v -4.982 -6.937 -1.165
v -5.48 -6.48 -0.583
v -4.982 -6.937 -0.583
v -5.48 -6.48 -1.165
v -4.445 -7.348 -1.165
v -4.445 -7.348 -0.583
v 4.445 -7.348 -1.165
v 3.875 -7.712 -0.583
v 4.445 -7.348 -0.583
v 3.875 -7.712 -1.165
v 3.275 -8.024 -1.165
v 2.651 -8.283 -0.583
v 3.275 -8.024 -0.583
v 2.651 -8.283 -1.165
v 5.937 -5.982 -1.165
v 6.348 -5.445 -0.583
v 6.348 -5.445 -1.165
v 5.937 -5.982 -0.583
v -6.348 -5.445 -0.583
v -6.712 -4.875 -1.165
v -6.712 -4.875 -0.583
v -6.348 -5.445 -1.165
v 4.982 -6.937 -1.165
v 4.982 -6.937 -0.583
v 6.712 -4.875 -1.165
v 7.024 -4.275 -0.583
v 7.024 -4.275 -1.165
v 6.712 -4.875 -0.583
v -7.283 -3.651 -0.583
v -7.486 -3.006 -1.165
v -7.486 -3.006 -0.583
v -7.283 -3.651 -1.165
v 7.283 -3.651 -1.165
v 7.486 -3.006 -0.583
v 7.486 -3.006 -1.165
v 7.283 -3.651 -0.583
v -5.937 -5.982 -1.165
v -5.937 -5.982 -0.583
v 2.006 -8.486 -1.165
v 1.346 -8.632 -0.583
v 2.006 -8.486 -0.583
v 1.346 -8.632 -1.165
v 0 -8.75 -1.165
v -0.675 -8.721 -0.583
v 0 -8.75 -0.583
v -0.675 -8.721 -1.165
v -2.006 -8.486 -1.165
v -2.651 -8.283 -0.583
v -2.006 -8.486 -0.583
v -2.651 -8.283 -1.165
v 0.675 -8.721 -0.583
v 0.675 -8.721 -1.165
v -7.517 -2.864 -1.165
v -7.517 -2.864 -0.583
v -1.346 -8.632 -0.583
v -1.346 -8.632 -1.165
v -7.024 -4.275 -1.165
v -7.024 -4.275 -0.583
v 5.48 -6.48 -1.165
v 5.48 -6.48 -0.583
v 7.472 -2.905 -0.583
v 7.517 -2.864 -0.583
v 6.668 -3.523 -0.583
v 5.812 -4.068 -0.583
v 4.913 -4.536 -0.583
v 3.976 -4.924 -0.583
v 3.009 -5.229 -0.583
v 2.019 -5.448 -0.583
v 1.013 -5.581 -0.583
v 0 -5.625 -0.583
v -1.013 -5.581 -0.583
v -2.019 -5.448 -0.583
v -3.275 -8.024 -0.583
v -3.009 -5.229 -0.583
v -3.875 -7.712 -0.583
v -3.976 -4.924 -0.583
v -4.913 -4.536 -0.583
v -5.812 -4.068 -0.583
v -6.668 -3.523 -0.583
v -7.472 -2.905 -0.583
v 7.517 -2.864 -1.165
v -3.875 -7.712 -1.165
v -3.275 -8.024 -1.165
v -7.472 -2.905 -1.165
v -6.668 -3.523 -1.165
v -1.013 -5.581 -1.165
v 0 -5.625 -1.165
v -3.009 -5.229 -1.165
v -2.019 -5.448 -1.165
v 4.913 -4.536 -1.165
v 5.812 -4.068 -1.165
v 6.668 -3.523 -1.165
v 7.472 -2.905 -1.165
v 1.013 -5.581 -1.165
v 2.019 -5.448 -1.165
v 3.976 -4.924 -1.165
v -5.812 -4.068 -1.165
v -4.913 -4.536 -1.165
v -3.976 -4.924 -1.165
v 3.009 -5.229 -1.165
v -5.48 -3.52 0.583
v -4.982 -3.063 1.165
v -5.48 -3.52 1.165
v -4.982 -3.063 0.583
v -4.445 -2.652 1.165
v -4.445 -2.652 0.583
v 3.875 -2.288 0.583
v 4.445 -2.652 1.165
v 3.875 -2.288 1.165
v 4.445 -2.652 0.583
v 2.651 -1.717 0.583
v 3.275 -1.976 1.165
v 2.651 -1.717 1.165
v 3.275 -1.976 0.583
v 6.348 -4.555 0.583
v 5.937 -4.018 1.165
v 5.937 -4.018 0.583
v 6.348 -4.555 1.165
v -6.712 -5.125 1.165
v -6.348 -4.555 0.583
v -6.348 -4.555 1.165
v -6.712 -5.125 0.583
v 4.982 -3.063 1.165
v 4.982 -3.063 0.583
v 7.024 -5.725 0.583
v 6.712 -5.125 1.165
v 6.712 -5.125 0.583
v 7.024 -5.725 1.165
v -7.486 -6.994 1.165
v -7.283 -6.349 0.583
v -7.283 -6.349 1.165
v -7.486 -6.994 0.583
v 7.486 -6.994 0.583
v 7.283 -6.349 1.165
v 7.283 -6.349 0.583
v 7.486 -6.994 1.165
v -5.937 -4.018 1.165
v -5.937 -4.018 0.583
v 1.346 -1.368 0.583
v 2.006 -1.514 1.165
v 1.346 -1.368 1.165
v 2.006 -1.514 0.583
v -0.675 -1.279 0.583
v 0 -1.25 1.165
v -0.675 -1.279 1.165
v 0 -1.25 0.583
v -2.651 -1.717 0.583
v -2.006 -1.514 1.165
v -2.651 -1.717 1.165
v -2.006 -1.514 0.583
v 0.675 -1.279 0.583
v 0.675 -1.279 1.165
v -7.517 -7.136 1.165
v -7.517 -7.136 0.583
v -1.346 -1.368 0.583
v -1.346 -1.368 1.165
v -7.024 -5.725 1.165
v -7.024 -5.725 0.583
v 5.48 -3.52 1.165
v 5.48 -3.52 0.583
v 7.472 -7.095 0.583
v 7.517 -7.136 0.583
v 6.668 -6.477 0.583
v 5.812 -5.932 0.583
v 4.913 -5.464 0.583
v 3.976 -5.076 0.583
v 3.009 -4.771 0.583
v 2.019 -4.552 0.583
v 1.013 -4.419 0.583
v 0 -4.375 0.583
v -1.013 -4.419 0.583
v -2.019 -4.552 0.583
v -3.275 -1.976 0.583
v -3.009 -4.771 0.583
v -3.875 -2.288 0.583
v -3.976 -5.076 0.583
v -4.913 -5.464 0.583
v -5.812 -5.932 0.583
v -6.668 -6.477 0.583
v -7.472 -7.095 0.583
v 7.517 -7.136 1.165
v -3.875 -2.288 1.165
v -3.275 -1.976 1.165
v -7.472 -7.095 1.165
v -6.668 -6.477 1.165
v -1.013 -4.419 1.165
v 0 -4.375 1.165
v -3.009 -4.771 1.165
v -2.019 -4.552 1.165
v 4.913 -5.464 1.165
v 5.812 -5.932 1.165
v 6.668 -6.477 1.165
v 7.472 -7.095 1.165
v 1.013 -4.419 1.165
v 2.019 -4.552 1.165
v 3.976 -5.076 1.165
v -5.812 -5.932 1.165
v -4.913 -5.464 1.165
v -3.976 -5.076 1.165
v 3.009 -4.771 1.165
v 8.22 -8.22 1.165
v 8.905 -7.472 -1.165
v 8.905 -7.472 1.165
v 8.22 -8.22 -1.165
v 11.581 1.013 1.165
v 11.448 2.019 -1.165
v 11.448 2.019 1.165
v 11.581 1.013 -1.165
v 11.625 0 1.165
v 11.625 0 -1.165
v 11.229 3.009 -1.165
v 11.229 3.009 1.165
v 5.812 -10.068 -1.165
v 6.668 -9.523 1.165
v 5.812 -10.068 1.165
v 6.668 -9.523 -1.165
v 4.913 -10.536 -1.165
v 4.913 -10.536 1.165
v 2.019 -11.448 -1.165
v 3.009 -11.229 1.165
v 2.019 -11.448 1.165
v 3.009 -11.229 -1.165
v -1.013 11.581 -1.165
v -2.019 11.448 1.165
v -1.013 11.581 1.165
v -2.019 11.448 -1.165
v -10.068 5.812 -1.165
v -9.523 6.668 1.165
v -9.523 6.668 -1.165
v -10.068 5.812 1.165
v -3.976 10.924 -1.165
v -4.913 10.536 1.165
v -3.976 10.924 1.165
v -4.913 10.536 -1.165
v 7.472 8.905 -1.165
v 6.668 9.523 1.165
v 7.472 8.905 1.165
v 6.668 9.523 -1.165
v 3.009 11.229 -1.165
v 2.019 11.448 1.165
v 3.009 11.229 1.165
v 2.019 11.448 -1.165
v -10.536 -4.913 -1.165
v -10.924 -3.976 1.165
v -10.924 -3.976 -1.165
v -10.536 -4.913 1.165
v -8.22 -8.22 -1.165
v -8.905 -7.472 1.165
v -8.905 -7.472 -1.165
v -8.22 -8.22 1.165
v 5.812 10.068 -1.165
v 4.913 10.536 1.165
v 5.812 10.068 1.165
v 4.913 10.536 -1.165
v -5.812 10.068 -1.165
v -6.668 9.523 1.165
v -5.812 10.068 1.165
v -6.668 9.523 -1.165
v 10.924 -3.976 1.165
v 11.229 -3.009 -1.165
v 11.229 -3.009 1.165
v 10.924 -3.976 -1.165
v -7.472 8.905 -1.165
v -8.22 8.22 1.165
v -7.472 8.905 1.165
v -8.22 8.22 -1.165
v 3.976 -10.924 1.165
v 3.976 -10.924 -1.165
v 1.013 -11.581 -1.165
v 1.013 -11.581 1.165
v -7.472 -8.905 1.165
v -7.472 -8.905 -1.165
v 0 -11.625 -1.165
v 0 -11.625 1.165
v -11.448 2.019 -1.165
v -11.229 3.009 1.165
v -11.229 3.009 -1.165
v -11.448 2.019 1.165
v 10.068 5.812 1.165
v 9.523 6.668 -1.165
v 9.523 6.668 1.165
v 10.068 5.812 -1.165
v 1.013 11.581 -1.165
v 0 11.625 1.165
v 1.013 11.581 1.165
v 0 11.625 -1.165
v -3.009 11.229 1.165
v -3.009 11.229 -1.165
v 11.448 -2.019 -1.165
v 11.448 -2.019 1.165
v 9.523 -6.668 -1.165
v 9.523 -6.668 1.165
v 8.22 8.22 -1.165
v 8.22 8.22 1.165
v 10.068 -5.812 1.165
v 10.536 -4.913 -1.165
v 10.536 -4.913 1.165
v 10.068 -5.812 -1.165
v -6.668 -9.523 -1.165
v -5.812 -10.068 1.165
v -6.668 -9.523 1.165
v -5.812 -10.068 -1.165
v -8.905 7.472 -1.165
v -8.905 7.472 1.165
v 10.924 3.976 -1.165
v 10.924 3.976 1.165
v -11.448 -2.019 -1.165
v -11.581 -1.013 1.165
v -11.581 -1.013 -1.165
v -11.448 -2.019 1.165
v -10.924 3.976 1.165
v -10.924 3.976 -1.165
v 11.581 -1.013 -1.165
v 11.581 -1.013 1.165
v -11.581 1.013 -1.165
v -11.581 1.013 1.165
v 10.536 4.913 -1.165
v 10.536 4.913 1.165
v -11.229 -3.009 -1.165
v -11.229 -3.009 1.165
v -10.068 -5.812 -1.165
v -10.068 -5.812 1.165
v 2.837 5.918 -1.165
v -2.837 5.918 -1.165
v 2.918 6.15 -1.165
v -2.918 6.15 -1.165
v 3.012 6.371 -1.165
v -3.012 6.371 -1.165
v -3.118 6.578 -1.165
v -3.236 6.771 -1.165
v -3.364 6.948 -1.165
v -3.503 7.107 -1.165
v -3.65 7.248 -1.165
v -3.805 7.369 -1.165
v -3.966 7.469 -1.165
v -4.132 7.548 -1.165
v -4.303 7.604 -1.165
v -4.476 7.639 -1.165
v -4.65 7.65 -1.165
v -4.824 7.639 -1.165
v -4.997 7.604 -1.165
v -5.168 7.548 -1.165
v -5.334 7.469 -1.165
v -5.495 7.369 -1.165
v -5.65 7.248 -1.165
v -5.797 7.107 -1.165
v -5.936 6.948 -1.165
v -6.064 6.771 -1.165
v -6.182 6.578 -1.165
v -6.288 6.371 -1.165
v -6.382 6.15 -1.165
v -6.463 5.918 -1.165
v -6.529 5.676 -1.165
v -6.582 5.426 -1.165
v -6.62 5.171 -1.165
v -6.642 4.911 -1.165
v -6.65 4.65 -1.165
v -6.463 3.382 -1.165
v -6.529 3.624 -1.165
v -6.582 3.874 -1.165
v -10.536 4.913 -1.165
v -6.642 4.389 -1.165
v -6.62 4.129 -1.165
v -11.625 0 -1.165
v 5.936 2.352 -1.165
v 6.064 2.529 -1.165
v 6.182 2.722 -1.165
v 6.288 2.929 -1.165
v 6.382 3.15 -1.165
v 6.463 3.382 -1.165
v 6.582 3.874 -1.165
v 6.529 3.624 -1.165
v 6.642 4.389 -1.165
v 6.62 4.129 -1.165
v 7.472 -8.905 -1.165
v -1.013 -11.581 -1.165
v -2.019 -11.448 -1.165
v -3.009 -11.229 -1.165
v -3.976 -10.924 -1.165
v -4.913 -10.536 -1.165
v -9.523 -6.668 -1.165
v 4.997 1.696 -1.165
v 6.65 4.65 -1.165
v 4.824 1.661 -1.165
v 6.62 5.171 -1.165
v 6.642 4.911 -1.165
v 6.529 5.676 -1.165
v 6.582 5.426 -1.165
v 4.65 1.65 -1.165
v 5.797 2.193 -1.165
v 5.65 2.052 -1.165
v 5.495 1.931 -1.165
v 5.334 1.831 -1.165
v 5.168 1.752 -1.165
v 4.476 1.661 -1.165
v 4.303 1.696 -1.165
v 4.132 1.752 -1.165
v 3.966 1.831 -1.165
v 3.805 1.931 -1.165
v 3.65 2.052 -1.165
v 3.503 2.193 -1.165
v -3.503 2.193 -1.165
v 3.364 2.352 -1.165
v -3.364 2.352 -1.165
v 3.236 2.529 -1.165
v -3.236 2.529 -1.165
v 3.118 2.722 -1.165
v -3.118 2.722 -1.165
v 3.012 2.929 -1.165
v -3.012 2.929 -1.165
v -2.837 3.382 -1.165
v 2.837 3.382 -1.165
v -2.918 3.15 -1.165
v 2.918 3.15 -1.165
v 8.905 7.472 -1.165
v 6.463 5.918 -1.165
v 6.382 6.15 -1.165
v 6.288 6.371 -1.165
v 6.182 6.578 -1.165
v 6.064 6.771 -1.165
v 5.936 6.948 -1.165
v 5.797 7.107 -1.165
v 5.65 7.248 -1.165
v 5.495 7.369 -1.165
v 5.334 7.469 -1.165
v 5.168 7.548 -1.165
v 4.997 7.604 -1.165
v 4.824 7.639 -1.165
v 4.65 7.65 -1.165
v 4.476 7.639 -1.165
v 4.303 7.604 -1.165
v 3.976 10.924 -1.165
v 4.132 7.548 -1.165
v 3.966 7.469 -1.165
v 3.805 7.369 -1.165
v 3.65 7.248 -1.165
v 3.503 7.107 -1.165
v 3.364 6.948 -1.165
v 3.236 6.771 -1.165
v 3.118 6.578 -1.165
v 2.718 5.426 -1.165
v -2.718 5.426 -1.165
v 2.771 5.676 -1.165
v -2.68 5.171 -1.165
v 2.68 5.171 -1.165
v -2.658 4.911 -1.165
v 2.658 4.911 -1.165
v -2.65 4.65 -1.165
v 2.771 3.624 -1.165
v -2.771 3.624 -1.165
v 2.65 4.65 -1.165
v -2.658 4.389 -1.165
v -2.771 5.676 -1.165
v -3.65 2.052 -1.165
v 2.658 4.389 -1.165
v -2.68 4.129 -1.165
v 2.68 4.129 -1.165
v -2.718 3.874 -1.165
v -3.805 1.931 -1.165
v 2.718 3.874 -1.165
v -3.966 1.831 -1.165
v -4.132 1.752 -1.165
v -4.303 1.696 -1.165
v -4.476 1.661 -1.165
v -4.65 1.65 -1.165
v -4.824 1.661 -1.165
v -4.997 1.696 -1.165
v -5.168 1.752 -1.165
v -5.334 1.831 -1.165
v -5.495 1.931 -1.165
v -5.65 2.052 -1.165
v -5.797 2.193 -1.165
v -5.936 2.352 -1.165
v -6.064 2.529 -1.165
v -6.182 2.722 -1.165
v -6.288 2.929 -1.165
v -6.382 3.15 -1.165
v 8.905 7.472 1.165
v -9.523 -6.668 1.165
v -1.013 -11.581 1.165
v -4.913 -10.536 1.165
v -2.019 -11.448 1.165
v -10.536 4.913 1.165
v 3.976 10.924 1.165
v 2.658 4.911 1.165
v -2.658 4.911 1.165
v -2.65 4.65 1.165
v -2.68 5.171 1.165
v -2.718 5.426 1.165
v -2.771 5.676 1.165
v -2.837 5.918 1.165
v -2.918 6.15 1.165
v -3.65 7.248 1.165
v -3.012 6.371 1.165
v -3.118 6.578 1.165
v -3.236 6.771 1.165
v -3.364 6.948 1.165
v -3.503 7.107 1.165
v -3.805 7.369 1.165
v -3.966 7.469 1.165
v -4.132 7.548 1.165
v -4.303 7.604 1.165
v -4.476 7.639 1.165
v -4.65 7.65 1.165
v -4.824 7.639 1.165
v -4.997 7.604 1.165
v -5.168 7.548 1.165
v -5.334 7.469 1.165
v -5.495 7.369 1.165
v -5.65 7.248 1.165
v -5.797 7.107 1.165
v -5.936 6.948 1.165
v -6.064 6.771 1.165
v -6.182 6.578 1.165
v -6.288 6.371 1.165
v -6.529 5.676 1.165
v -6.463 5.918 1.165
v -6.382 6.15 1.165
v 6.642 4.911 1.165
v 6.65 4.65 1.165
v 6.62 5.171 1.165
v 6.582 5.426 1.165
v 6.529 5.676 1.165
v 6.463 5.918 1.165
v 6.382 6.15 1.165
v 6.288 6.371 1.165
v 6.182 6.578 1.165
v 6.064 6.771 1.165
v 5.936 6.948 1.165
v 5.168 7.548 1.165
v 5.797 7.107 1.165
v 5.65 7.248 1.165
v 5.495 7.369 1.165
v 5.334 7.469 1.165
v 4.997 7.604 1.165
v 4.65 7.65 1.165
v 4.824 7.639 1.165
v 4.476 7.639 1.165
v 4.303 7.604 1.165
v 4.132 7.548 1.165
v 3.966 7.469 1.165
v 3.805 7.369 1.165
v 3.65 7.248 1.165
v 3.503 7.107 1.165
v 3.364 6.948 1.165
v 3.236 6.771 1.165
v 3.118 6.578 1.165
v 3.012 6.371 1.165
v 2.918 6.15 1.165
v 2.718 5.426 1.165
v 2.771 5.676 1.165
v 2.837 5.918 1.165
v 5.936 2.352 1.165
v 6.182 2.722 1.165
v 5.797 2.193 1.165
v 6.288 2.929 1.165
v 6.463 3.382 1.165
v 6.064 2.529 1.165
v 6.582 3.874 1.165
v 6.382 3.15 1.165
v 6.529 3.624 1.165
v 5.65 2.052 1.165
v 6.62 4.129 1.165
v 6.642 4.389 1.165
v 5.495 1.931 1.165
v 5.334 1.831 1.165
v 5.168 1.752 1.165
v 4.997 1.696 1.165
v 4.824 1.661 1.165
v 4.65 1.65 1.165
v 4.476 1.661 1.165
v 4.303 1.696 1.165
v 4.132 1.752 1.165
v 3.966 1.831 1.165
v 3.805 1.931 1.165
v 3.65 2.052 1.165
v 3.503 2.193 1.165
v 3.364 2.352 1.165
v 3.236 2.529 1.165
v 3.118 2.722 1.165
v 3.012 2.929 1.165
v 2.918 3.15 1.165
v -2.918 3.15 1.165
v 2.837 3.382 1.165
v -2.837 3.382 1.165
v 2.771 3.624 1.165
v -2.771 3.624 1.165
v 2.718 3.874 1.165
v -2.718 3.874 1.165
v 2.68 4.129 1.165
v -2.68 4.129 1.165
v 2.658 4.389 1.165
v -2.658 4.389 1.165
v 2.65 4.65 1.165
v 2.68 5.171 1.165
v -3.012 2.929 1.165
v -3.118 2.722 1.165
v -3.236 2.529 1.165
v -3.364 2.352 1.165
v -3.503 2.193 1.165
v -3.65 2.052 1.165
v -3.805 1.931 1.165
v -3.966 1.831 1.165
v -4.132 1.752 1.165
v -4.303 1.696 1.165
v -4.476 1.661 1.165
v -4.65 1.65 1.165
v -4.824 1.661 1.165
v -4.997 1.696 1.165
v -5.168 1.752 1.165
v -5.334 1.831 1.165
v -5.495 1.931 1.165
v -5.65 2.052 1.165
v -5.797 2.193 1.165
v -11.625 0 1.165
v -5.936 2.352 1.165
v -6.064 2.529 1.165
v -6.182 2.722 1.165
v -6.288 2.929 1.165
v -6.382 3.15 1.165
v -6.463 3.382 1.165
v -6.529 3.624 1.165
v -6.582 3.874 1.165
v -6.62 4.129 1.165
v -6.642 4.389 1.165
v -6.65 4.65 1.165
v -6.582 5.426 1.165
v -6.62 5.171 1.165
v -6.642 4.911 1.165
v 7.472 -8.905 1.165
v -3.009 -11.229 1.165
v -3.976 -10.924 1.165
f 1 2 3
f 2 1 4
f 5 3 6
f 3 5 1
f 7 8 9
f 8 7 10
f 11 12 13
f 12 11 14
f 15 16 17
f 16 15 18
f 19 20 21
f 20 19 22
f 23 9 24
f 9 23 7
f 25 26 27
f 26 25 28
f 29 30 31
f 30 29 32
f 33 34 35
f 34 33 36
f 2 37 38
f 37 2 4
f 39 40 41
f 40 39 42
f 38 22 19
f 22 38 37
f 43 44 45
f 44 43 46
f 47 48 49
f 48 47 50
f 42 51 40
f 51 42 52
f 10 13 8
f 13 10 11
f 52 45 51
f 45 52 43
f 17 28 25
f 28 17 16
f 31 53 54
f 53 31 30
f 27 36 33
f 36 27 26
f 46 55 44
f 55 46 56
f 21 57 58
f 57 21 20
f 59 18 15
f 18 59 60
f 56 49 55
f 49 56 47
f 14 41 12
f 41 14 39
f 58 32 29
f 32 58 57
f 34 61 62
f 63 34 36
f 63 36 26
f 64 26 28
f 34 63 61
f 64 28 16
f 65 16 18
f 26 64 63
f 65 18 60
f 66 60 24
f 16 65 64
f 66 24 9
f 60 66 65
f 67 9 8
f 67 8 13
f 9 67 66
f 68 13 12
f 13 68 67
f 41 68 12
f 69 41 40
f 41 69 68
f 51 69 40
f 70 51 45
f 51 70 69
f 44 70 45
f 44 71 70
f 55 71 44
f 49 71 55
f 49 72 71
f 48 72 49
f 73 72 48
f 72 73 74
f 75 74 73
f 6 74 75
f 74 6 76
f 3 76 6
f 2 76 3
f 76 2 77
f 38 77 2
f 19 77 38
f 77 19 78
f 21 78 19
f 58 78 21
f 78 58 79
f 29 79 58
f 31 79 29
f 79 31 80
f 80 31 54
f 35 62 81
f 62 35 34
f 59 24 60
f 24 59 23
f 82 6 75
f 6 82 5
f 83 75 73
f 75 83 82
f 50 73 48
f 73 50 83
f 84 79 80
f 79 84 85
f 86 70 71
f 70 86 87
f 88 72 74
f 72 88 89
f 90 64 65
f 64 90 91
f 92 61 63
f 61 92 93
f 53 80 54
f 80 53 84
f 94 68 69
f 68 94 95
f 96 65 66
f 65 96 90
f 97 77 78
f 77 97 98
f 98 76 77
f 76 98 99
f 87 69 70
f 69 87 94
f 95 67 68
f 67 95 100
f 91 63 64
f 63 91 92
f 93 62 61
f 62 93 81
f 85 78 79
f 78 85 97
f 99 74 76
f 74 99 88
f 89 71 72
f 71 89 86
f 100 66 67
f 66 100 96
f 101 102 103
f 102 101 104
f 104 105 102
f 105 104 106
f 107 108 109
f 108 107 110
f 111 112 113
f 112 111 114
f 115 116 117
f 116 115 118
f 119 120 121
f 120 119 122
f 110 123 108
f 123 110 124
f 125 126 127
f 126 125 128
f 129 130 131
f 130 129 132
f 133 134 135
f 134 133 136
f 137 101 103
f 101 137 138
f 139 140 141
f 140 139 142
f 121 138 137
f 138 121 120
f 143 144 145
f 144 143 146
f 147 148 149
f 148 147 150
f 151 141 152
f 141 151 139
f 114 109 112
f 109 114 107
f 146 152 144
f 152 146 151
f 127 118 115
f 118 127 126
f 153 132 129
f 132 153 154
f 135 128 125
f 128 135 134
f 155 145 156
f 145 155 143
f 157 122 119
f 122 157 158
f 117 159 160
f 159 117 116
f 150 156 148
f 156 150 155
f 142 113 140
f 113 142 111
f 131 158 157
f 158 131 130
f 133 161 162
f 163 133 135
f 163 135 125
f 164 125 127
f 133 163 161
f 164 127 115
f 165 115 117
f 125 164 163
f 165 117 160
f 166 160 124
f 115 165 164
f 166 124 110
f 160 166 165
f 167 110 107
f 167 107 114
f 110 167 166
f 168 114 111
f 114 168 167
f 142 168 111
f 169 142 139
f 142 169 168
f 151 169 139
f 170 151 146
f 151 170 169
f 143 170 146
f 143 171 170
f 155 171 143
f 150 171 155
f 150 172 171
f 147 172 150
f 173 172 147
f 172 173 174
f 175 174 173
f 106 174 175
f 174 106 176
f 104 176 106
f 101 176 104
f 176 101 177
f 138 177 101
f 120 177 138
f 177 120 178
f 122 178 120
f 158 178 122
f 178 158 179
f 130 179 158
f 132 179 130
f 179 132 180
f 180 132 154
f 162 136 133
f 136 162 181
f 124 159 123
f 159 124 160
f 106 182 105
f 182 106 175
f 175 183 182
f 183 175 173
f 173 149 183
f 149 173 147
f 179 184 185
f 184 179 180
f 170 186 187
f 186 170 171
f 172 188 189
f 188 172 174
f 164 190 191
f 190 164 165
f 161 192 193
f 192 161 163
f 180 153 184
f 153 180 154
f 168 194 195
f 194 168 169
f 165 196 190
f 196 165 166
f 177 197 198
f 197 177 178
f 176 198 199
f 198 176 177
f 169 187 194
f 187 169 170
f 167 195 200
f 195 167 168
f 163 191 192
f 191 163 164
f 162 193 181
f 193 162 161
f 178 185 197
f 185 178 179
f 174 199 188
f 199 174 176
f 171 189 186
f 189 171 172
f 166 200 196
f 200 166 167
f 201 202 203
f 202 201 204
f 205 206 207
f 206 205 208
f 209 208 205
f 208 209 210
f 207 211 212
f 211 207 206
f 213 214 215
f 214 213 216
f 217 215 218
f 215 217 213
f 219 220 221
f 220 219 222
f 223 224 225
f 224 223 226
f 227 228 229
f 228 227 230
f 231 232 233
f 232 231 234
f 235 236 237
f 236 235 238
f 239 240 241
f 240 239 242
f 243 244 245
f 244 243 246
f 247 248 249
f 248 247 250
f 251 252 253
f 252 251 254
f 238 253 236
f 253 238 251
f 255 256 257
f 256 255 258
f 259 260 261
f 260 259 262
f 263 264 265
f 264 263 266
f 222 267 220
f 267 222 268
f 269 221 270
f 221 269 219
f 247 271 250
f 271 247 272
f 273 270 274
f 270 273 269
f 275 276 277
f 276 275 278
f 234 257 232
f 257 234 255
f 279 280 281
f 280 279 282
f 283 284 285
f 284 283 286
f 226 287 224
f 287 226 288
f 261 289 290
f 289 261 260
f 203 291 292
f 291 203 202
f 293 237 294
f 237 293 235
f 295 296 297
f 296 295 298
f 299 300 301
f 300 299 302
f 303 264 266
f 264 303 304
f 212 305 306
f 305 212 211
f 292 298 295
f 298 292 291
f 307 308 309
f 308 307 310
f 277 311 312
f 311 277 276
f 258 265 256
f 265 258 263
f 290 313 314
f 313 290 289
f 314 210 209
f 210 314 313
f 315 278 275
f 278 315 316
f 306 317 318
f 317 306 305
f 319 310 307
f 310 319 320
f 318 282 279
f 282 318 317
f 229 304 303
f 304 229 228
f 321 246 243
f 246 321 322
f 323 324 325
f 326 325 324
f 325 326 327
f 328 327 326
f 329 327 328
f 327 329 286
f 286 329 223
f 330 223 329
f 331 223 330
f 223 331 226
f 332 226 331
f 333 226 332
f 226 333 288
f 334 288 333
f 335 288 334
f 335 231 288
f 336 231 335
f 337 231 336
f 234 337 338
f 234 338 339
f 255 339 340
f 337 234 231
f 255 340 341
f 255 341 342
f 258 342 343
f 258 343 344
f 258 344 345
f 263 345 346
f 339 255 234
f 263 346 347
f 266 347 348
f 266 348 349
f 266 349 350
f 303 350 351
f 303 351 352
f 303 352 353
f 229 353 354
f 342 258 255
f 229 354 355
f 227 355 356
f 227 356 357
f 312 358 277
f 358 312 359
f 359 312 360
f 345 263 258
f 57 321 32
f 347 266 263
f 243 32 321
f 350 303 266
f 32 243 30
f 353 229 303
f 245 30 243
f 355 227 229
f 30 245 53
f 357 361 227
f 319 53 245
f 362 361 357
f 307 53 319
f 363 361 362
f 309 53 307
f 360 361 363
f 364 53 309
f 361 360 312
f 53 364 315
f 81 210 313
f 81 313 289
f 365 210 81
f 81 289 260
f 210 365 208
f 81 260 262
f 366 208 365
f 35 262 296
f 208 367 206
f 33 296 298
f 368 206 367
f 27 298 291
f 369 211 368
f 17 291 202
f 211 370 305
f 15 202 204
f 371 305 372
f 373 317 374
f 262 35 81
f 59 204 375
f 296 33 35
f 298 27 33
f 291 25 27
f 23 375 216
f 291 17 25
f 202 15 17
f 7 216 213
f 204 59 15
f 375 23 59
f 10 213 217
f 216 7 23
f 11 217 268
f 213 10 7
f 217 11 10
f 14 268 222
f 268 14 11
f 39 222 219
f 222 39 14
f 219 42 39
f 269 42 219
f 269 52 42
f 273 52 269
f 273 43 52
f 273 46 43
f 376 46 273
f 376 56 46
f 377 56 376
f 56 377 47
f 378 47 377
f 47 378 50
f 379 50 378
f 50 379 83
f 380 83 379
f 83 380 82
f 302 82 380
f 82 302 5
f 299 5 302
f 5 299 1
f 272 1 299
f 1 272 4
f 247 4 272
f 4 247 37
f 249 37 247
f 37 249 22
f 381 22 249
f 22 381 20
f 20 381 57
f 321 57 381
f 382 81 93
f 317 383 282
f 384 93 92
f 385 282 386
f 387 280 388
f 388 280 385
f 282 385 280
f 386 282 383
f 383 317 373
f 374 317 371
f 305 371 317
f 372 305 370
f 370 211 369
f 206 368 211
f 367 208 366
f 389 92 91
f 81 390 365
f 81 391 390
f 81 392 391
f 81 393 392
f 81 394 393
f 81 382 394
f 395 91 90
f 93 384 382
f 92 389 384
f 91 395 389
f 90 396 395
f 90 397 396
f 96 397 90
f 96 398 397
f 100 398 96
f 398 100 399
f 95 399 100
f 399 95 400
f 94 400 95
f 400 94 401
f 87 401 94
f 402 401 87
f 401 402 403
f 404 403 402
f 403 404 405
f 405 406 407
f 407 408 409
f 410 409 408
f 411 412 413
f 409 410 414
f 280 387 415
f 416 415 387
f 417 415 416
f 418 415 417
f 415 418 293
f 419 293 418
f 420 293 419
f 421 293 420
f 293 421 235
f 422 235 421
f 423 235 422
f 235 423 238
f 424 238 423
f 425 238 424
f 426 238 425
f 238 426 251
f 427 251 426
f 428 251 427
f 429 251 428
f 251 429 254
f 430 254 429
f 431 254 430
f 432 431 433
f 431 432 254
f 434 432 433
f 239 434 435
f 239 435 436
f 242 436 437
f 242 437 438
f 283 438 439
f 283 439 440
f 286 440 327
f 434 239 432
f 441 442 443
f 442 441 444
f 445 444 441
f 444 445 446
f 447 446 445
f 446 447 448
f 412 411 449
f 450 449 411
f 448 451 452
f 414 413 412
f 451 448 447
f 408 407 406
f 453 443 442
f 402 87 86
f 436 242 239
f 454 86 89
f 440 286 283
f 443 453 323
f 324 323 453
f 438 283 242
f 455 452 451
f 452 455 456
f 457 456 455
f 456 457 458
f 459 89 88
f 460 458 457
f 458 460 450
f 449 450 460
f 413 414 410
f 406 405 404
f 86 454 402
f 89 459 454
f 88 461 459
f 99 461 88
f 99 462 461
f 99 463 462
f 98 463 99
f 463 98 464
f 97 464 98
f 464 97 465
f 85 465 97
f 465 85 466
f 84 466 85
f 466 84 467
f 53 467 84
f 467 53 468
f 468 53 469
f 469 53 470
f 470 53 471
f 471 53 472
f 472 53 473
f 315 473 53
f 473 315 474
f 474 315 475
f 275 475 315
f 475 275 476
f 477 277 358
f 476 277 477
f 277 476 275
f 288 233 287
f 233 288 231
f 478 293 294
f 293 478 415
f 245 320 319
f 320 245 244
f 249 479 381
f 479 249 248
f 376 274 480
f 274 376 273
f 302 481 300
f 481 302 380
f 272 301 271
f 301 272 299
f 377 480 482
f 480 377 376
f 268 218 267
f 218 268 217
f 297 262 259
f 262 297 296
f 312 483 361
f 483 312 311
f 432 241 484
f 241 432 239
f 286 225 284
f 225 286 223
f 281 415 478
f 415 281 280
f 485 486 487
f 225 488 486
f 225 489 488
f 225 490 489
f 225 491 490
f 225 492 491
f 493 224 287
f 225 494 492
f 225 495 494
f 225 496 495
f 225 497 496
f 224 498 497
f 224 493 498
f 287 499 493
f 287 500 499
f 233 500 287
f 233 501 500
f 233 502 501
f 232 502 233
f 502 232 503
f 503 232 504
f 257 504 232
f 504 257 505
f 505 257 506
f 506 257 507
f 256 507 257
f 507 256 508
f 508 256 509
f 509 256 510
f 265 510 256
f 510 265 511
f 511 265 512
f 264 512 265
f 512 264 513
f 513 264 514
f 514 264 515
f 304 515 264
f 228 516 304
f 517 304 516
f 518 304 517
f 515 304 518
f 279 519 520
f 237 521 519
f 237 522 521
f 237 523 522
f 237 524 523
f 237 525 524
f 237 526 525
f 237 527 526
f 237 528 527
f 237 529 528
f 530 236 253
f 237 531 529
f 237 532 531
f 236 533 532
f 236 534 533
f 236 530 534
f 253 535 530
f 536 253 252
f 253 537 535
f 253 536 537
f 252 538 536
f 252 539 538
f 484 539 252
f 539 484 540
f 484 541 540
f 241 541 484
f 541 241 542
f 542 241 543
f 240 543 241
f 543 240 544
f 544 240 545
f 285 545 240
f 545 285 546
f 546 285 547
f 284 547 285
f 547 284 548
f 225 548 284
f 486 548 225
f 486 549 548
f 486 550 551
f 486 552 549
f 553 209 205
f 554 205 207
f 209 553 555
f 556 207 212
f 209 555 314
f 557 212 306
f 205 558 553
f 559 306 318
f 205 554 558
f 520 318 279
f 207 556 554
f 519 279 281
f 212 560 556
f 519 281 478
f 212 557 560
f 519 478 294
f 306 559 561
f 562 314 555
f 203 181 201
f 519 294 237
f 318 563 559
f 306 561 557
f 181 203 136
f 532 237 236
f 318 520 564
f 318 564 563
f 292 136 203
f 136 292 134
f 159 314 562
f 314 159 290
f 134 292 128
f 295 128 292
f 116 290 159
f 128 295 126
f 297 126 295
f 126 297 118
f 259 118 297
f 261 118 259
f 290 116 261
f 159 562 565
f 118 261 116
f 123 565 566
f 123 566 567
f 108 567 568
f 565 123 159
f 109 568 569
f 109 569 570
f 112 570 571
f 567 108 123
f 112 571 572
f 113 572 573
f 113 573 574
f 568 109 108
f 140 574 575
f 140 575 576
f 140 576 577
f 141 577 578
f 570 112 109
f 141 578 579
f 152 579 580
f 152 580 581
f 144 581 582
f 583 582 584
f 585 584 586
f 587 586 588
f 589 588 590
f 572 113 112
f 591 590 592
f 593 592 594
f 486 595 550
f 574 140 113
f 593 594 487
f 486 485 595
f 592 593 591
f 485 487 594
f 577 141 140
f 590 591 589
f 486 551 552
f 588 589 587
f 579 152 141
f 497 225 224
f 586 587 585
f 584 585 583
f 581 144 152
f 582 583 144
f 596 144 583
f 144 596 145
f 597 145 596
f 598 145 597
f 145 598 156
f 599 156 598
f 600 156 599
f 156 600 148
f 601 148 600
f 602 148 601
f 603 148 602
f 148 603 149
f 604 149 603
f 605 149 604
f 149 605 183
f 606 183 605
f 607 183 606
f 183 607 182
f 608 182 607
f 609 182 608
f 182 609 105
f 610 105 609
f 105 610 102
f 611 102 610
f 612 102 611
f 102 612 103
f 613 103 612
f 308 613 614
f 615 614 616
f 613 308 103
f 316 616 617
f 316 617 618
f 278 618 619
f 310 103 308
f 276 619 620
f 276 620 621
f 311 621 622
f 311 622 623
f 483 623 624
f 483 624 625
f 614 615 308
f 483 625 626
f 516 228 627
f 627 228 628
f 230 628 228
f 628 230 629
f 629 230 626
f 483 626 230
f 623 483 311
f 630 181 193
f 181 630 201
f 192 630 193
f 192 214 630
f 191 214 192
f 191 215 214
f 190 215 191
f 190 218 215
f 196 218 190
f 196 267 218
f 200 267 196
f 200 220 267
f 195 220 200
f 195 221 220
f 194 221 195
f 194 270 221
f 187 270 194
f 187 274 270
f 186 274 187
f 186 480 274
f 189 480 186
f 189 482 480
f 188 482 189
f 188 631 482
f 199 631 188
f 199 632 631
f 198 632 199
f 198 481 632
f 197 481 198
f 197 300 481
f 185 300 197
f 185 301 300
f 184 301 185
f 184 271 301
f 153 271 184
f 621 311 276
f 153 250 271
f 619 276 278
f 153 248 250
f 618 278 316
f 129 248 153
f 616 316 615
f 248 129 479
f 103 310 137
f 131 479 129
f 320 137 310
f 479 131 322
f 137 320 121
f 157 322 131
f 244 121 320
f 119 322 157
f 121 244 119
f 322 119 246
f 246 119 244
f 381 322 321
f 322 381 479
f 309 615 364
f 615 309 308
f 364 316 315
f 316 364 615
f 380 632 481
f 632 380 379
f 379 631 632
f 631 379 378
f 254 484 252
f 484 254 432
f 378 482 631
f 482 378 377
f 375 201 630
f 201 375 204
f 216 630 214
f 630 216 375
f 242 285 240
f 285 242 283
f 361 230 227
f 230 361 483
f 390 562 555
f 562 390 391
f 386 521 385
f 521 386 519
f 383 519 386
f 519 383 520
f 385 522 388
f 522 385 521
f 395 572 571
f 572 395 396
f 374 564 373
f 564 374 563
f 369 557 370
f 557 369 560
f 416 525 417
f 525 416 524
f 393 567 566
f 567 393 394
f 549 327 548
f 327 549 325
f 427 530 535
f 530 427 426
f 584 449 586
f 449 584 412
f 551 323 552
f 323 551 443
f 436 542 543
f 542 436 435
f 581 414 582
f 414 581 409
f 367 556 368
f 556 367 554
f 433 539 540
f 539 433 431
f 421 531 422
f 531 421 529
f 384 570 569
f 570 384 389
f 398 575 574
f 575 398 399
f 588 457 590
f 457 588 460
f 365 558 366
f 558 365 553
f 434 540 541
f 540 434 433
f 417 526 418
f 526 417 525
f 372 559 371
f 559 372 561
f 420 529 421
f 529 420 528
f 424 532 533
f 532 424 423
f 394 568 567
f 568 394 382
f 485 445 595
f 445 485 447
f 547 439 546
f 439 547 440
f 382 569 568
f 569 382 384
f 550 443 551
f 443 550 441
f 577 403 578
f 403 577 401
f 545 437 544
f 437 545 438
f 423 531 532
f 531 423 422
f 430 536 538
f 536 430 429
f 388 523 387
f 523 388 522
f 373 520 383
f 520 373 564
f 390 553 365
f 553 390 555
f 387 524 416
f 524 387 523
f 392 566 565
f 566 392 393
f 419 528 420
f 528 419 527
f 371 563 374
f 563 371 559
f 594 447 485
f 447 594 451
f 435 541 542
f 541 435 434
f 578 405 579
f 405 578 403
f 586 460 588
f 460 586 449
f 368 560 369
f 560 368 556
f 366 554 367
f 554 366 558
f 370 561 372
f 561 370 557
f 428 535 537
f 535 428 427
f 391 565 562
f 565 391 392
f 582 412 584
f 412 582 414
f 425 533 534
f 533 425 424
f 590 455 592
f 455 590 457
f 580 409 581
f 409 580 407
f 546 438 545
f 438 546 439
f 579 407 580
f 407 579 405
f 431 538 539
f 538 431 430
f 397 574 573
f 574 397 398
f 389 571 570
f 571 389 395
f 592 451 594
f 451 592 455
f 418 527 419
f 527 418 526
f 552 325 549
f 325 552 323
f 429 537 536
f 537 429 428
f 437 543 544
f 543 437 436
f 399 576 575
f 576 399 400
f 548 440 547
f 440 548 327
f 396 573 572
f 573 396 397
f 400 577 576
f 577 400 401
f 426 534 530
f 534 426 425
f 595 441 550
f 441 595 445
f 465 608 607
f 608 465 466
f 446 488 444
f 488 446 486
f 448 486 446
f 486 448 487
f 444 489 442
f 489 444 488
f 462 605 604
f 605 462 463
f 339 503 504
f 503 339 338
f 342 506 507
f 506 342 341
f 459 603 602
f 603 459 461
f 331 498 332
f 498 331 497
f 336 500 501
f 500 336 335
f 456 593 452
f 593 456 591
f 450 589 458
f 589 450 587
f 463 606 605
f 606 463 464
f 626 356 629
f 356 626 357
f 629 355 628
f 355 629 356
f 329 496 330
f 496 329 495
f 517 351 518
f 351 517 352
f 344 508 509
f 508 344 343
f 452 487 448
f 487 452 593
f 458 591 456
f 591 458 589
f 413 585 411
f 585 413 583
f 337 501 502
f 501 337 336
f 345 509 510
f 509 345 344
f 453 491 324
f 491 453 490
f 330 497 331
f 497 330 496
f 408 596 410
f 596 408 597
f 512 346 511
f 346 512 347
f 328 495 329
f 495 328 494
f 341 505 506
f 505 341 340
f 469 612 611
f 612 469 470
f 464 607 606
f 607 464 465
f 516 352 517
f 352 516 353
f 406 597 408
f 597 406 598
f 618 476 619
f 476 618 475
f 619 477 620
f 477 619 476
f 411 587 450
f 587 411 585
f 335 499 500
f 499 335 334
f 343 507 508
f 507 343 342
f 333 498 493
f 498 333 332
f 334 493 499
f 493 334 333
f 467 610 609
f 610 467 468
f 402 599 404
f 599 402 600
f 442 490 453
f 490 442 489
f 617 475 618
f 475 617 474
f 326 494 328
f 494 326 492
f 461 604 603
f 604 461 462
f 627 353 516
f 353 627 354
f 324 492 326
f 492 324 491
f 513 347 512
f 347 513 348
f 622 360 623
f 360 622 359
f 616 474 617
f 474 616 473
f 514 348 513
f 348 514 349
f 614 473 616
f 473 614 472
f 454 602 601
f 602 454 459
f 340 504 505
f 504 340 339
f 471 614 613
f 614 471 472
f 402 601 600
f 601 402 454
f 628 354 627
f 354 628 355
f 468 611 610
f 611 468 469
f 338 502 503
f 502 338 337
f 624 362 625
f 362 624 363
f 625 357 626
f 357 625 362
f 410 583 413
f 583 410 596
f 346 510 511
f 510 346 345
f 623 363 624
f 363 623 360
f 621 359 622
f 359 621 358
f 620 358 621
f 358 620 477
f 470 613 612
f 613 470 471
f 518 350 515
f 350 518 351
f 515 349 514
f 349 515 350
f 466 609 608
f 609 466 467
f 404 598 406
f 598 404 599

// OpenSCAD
$fn = 72;

h = 2.33;
d = 23.25;
eye = 4;

difference()
{
    cylinder(h=h, d=d, center=true);
    translate([d/5, d/5, 0]) scale([1, 1.5, 1]) cylinder(h=h, d=eye, center=true);
    translate([-d/5, d/5, 0]) scale([1, 1.5, 1]) cylinder(h=h, d=eye, center=true);
    
    translate([0, -1, -h/2]) difference()
    {
        cylinder(h=h/2, d=d*2/3, center=true);
        translate([0, 7, 0]) cylinder(h=h/2, d=d*3/3, center=true);
    }

    translate([0, -9, h/2]) rotate ([180, 0, 0]) difference()
    {
        cylinder(h=h/2, d=d*2/3, center=true);
        translate([0, 7, 0]) cylinder(h=h/2, d=d*3/3, center=true);
    }
}
